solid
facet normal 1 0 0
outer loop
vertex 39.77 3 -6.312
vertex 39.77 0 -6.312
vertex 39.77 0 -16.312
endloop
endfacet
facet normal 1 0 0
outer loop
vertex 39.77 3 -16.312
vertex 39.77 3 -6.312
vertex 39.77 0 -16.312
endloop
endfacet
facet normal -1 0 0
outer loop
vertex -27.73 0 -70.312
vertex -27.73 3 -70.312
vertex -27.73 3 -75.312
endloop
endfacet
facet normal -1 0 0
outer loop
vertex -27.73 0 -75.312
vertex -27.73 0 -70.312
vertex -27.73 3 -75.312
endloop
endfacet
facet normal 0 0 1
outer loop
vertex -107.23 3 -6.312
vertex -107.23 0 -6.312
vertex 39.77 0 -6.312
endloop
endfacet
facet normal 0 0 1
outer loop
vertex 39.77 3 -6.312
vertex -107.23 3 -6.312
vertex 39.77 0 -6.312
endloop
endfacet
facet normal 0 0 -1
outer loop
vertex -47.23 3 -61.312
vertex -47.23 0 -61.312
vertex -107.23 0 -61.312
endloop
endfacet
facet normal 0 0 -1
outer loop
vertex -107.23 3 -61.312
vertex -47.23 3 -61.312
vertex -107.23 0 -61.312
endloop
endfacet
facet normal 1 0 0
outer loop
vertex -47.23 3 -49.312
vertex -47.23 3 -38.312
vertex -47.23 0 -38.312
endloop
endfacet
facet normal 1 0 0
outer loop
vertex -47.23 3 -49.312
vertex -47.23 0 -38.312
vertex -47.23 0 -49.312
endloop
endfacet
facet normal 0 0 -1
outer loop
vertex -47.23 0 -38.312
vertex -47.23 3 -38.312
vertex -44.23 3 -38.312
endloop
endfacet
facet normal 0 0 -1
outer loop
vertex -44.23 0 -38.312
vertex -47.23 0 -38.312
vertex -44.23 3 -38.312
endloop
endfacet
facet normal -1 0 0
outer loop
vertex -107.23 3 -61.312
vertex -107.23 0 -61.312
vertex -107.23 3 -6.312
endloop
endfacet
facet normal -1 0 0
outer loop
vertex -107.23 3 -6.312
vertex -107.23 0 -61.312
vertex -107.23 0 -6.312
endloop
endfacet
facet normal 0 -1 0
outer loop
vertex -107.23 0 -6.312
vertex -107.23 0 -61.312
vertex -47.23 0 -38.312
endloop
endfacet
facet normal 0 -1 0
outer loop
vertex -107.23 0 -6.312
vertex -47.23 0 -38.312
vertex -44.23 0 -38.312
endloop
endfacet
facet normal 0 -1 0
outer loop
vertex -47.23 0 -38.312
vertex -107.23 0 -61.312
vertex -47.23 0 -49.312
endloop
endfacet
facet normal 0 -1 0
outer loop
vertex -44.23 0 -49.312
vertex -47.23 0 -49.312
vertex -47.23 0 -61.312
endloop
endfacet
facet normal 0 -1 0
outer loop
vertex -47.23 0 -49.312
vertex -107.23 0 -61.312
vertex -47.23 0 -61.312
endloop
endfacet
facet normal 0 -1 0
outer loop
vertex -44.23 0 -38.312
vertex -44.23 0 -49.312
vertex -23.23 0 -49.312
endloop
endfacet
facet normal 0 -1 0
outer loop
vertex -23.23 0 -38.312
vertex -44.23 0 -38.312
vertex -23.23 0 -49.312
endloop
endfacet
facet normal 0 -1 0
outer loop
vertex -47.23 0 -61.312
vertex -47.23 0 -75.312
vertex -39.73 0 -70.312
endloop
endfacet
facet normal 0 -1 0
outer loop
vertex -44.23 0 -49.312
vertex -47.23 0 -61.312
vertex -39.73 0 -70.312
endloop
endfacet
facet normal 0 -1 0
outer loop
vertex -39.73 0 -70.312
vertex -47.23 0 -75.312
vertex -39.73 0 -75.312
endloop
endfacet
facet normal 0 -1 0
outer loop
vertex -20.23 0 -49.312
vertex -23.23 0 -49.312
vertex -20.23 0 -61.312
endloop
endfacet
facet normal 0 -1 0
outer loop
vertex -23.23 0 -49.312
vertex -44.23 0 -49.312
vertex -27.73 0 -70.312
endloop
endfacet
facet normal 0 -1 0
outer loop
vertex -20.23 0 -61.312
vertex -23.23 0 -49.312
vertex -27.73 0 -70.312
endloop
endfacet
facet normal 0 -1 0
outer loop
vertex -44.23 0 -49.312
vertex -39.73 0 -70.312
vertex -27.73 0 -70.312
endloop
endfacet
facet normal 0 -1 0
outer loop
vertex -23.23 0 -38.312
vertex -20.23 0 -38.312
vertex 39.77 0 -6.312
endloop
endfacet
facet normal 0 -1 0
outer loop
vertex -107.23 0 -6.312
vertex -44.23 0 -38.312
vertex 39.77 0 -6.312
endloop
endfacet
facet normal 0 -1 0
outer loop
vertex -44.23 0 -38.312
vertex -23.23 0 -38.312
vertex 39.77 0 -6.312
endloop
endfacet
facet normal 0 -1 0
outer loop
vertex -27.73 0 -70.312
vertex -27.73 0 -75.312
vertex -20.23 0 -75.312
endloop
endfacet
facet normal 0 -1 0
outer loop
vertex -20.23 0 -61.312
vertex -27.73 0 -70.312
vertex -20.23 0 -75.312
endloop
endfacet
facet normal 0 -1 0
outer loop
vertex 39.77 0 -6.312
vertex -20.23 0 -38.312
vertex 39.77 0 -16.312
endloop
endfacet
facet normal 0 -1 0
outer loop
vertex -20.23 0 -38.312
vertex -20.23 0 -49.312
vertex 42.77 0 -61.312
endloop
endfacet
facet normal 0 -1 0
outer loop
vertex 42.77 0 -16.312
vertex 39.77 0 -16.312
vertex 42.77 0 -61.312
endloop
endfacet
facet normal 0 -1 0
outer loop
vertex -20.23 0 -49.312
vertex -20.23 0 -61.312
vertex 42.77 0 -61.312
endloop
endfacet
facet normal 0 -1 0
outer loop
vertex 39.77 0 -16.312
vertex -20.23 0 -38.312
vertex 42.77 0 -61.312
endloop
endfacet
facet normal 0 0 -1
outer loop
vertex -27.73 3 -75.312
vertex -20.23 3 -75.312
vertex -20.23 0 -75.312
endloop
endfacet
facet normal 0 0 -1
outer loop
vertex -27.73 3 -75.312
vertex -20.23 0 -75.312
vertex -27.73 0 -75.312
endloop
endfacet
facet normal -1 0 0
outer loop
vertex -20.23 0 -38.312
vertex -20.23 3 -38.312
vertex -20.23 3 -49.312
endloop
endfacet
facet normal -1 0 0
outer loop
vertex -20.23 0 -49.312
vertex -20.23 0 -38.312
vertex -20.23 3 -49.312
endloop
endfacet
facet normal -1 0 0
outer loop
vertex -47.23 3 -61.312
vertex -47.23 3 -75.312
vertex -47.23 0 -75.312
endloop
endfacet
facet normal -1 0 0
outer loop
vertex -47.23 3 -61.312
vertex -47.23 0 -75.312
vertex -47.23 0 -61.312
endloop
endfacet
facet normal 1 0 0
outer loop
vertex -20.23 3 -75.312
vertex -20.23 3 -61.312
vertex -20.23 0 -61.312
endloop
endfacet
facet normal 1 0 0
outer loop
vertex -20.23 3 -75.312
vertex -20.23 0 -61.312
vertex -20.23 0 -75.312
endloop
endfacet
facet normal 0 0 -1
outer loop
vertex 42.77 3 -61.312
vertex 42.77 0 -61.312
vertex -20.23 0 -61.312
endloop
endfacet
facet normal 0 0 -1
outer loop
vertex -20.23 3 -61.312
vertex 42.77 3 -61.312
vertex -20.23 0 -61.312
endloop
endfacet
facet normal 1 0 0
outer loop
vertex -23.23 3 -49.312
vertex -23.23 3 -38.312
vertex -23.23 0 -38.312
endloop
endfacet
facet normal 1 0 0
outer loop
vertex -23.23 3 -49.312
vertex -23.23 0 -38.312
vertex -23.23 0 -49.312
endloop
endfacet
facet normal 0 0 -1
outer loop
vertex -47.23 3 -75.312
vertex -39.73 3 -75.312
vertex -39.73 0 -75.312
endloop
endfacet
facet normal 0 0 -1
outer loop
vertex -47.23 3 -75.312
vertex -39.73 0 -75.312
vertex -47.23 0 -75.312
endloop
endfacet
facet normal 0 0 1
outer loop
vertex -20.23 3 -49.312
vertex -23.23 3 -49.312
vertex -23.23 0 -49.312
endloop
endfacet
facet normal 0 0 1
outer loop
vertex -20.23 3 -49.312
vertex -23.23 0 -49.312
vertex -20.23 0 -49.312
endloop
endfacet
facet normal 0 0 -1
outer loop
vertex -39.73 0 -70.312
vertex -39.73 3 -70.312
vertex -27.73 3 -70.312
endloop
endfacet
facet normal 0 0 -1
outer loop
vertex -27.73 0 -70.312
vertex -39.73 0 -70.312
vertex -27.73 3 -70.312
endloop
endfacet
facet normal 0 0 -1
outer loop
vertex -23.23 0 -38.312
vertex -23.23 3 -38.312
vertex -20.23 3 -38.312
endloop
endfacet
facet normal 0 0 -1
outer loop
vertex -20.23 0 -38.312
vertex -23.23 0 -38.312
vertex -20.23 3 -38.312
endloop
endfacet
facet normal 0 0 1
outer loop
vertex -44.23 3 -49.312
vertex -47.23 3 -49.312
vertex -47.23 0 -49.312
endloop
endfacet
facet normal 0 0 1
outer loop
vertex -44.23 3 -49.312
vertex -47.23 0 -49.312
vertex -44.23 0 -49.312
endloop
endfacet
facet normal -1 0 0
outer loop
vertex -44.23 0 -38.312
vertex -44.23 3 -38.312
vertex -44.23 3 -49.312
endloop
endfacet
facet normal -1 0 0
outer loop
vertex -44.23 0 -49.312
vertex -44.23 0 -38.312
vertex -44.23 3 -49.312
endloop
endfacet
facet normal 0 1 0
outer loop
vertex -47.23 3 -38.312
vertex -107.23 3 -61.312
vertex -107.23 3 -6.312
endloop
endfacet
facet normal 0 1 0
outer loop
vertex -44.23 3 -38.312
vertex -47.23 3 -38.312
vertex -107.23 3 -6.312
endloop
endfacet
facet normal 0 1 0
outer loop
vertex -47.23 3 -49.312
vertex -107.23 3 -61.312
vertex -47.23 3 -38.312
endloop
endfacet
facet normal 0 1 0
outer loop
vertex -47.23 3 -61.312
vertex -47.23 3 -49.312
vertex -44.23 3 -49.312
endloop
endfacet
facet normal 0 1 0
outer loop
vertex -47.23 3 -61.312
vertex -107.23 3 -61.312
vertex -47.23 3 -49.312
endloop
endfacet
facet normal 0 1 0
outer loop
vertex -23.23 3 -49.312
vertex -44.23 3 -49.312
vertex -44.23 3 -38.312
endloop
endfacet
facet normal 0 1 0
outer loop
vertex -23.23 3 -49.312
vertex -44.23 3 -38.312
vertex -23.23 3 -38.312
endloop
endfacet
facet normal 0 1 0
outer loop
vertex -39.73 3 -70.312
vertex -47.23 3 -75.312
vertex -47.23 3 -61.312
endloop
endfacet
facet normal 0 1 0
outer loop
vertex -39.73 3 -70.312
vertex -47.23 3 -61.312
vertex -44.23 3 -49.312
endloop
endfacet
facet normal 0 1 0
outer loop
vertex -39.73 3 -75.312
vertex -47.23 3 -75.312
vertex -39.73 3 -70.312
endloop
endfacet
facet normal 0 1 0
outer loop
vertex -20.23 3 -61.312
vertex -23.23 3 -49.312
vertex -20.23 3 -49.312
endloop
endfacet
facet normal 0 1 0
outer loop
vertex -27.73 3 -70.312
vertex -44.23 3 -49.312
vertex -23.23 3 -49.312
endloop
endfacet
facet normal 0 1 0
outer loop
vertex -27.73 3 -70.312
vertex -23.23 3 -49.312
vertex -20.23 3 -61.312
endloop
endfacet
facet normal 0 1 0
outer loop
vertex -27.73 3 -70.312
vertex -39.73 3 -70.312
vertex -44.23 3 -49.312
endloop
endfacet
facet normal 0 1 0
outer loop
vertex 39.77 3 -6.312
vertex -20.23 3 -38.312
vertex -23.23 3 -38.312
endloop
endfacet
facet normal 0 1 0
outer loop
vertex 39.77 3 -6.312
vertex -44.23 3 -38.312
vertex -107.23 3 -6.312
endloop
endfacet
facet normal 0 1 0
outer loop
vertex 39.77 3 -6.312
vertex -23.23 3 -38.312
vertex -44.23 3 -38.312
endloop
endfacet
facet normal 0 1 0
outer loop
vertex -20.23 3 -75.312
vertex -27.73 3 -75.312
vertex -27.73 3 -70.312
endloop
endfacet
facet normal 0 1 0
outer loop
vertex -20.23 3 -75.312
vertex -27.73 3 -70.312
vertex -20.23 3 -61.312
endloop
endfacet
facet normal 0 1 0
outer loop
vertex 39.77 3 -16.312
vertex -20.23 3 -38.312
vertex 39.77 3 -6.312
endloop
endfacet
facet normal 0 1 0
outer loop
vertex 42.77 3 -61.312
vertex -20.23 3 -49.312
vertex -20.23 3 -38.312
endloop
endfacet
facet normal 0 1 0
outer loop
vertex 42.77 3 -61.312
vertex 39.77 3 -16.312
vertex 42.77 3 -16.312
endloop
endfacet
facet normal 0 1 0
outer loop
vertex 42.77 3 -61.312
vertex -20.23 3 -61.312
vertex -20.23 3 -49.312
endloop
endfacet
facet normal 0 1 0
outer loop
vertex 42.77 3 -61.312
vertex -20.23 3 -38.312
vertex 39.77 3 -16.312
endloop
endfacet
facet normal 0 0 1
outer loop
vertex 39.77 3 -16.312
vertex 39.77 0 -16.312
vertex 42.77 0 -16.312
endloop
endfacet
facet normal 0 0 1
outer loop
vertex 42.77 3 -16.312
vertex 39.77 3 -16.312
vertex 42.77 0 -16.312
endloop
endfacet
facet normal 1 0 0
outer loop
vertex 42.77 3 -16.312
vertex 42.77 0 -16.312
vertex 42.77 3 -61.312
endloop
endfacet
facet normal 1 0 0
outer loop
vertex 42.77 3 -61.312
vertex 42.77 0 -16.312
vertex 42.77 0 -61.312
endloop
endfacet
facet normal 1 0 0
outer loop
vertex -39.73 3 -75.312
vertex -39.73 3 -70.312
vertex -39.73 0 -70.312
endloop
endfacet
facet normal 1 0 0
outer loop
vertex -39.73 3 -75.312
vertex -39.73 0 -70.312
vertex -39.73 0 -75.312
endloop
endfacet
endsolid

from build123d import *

# Parameters (mm, degrees)
BOSS_EXTRUDE1_DEPTH = 3
SKETCH2_W           = 3
SKETCH2_H           = 11
CUT_EXTRUDE2_DEPTH  = 3
BOSS_EXTRUDE3_DEPTH = 3
SKETCH4_W           = 12
SKETCH4_H           = 10
CUT_EXTRUDE3_DEPTH  = 3


with BuildPart() as part:
    # Sketch1 → Boss-Extrude1 (new body)
    with BuildSketch(Plane(origin=(0, 0, 0), x_dir=(1, 0, 0), z_dir=(0, 1, 0))):
        Polygon((-104.229716691, 61.311583722), (-107.229716691, 61.311583722), (-107.229716691, 51.311583722), (-107.229716691, 6.311583722), (39.770283309, 6.311583722), (39.770283309, 16.311583722), (42.770283309, 16.311583722), (42.770283309, 61.311583722), align=None)
    extrude(amount=BOSS_EXTRUDE1_DEPTH)

    # Sketch2 → Cut-Extrude2 (cut)
    with BuildSketch(Plane(origin=(0, 3, 0), x_dir=(1, 0, 0), z_dir=(0, 1, 0))):
        with Locations((-45.729716691, 43.811583722)):
            Rectangle(SKETCH2_W, SKETCH2_H)
        with Locations((-21.729716691, 43.811583722)):
            Rectangle(SKETCH2_W, SKETCH2_H)
    extrude(amount=-CUT_EXTRUDE2_DEPTH, mode=Mode.SUBTRACT)

    # Sketch3 → Boss-Extrude3 (add)
    with BuildSketch(Plane(origin=(0, 3, 0), x_dir=(1, 0, 0), z_dir=(0, 1, 0))):
        Polygon((-47.229716691, 70.310935644), (-47.229716691, 61.311583722), (-20.229716691, 61.311583722), (-20.229716691, 70.310935644), (-20.229716691, 75.311583722), (-47.229716691, 75.311583722), align=None)
    extrude(amount=-BOSS_EXTRUDE3_DEPTH)

    # Sketch4 → Cut-Extrude3 (cut)
    with BuildSketch(Plane(origin=(0, 3, 0), x_dir=(1, 0, 0), z_dir=(0, 1, 0))):
        with Locations((-33.729716691, 75.311583722)):
            Rectangle(SKETCH4_W, SKETCH4_H)
    extrude(amount=-CUT_EXTRUDE3_DEPTH, mode=Mode.SUBTRACT)


solid = part.part
